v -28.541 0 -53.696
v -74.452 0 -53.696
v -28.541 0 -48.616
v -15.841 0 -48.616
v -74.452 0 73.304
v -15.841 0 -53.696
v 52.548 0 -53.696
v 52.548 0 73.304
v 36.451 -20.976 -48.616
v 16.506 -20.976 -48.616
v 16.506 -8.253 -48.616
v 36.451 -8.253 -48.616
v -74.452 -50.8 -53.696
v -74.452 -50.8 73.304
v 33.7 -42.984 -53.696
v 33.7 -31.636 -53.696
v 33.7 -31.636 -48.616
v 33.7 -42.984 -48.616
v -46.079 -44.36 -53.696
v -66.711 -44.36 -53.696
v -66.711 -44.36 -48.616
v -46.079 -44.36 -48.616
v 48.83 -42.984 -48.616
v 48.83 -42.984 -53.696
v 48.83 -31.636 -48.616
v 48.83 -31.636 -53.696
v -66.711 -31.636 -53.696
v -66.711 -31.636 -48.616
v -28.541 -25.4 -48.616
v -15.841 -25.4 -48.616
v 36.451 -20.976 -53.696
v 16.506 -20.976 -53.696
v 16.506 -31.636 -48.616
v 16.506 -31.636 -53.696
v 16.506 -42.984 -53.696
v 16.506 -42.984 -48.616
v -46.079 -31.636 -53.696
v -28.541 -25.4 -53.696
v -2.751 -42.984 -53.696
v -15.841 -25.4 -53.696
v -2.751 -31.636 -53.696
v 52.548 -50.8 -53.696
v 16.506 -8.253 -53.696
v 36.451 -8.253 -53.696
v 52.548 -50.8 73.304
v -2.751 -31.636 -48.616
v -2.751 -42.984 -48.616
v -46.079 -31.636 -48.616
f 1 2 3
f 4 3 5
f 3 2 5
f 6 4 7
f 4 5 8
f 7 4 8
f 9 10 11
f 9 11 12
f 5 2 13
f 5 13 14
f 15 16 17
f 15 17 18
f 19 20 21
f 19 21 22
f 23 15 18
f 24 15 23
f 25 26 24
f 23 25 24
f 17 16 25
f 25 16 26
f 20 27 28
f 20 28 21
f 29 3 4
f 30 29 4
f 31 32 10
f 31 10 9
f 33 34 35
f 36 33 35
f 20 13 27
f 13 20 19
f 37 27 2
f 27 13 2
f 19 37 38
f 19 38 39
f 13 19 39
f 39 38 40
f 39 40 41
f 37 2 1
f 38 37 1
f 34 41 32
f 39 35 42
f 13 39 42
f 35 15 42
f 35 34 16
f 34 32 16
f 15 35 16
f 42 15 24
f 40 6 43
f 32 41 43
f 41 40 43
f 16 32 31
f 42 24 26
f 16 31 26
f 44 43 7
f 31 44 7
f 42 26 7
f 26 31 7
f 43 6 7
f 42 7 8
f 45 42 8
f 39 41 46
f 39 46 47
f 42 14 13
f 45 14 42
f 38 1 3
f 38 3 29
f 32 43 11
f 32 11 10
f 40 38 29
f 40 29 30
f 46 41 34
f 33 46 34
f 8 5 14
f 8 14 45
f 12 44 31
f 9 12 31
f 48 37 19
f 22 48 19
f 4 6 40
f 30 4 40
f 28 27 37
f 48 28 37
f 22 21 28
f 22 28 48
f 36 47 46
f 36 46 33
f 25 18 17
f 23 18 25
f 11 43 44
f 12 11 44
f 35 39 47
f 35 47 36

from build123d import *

# Parameters (mm, degrees)
F0_W     = 127
F0_H     = 127
F1_DEPTH = 50.8
F2_W     = 20.632386
F2_H     = 12.723304
F2_W_2   = 12.7
F2_H_2   = 25.4
F2_W_3   = 19.256888
F2_H_3   = 11.347811
F2_W_4   = 15.130423
F2_W_5   = 19.944644
F2_H_4   = 12.723305
F3_DEPTH = 5.08


with BuildPart() as f1:
    # F0 (on Front) → F1 (new body)
    with BuildSketch(Plane.XZ):
        with Locations((-10.951542, 9.803599)):
            Rectangle(F0_W, F0_H)
    extrude(amount=F1_DEPTH)

    # F2 (on face) → F3 (cut)
    with BuildSketch(Plane(origin=(0, 0, -53.696401), x_dir=(1, 0, 0), z_dir=(0, 0, -1))):
        with Locations((-56.395188, 37.99798)):
            Rectangle(F2_W, F2_H)
        with Locations((-22.191468, 12.7)):
            Rectangle(F2_W_2, F2_H_2)
        with Locations((6.877462, 37.310233)):
            Rectangle(F2_W_3, F2_H_3)
        with Locations((41.264772, 37.310233)):
            Rectangle(F2_W_4, F2_H_3)
        with Locations((26.478228, 14.614607)):
            Rectangle(F2_W_5, F2_H_4)
    extrude(amount=-F3_DEPTH, mode=Mode.SUBTRACT)


solid = f1.part
